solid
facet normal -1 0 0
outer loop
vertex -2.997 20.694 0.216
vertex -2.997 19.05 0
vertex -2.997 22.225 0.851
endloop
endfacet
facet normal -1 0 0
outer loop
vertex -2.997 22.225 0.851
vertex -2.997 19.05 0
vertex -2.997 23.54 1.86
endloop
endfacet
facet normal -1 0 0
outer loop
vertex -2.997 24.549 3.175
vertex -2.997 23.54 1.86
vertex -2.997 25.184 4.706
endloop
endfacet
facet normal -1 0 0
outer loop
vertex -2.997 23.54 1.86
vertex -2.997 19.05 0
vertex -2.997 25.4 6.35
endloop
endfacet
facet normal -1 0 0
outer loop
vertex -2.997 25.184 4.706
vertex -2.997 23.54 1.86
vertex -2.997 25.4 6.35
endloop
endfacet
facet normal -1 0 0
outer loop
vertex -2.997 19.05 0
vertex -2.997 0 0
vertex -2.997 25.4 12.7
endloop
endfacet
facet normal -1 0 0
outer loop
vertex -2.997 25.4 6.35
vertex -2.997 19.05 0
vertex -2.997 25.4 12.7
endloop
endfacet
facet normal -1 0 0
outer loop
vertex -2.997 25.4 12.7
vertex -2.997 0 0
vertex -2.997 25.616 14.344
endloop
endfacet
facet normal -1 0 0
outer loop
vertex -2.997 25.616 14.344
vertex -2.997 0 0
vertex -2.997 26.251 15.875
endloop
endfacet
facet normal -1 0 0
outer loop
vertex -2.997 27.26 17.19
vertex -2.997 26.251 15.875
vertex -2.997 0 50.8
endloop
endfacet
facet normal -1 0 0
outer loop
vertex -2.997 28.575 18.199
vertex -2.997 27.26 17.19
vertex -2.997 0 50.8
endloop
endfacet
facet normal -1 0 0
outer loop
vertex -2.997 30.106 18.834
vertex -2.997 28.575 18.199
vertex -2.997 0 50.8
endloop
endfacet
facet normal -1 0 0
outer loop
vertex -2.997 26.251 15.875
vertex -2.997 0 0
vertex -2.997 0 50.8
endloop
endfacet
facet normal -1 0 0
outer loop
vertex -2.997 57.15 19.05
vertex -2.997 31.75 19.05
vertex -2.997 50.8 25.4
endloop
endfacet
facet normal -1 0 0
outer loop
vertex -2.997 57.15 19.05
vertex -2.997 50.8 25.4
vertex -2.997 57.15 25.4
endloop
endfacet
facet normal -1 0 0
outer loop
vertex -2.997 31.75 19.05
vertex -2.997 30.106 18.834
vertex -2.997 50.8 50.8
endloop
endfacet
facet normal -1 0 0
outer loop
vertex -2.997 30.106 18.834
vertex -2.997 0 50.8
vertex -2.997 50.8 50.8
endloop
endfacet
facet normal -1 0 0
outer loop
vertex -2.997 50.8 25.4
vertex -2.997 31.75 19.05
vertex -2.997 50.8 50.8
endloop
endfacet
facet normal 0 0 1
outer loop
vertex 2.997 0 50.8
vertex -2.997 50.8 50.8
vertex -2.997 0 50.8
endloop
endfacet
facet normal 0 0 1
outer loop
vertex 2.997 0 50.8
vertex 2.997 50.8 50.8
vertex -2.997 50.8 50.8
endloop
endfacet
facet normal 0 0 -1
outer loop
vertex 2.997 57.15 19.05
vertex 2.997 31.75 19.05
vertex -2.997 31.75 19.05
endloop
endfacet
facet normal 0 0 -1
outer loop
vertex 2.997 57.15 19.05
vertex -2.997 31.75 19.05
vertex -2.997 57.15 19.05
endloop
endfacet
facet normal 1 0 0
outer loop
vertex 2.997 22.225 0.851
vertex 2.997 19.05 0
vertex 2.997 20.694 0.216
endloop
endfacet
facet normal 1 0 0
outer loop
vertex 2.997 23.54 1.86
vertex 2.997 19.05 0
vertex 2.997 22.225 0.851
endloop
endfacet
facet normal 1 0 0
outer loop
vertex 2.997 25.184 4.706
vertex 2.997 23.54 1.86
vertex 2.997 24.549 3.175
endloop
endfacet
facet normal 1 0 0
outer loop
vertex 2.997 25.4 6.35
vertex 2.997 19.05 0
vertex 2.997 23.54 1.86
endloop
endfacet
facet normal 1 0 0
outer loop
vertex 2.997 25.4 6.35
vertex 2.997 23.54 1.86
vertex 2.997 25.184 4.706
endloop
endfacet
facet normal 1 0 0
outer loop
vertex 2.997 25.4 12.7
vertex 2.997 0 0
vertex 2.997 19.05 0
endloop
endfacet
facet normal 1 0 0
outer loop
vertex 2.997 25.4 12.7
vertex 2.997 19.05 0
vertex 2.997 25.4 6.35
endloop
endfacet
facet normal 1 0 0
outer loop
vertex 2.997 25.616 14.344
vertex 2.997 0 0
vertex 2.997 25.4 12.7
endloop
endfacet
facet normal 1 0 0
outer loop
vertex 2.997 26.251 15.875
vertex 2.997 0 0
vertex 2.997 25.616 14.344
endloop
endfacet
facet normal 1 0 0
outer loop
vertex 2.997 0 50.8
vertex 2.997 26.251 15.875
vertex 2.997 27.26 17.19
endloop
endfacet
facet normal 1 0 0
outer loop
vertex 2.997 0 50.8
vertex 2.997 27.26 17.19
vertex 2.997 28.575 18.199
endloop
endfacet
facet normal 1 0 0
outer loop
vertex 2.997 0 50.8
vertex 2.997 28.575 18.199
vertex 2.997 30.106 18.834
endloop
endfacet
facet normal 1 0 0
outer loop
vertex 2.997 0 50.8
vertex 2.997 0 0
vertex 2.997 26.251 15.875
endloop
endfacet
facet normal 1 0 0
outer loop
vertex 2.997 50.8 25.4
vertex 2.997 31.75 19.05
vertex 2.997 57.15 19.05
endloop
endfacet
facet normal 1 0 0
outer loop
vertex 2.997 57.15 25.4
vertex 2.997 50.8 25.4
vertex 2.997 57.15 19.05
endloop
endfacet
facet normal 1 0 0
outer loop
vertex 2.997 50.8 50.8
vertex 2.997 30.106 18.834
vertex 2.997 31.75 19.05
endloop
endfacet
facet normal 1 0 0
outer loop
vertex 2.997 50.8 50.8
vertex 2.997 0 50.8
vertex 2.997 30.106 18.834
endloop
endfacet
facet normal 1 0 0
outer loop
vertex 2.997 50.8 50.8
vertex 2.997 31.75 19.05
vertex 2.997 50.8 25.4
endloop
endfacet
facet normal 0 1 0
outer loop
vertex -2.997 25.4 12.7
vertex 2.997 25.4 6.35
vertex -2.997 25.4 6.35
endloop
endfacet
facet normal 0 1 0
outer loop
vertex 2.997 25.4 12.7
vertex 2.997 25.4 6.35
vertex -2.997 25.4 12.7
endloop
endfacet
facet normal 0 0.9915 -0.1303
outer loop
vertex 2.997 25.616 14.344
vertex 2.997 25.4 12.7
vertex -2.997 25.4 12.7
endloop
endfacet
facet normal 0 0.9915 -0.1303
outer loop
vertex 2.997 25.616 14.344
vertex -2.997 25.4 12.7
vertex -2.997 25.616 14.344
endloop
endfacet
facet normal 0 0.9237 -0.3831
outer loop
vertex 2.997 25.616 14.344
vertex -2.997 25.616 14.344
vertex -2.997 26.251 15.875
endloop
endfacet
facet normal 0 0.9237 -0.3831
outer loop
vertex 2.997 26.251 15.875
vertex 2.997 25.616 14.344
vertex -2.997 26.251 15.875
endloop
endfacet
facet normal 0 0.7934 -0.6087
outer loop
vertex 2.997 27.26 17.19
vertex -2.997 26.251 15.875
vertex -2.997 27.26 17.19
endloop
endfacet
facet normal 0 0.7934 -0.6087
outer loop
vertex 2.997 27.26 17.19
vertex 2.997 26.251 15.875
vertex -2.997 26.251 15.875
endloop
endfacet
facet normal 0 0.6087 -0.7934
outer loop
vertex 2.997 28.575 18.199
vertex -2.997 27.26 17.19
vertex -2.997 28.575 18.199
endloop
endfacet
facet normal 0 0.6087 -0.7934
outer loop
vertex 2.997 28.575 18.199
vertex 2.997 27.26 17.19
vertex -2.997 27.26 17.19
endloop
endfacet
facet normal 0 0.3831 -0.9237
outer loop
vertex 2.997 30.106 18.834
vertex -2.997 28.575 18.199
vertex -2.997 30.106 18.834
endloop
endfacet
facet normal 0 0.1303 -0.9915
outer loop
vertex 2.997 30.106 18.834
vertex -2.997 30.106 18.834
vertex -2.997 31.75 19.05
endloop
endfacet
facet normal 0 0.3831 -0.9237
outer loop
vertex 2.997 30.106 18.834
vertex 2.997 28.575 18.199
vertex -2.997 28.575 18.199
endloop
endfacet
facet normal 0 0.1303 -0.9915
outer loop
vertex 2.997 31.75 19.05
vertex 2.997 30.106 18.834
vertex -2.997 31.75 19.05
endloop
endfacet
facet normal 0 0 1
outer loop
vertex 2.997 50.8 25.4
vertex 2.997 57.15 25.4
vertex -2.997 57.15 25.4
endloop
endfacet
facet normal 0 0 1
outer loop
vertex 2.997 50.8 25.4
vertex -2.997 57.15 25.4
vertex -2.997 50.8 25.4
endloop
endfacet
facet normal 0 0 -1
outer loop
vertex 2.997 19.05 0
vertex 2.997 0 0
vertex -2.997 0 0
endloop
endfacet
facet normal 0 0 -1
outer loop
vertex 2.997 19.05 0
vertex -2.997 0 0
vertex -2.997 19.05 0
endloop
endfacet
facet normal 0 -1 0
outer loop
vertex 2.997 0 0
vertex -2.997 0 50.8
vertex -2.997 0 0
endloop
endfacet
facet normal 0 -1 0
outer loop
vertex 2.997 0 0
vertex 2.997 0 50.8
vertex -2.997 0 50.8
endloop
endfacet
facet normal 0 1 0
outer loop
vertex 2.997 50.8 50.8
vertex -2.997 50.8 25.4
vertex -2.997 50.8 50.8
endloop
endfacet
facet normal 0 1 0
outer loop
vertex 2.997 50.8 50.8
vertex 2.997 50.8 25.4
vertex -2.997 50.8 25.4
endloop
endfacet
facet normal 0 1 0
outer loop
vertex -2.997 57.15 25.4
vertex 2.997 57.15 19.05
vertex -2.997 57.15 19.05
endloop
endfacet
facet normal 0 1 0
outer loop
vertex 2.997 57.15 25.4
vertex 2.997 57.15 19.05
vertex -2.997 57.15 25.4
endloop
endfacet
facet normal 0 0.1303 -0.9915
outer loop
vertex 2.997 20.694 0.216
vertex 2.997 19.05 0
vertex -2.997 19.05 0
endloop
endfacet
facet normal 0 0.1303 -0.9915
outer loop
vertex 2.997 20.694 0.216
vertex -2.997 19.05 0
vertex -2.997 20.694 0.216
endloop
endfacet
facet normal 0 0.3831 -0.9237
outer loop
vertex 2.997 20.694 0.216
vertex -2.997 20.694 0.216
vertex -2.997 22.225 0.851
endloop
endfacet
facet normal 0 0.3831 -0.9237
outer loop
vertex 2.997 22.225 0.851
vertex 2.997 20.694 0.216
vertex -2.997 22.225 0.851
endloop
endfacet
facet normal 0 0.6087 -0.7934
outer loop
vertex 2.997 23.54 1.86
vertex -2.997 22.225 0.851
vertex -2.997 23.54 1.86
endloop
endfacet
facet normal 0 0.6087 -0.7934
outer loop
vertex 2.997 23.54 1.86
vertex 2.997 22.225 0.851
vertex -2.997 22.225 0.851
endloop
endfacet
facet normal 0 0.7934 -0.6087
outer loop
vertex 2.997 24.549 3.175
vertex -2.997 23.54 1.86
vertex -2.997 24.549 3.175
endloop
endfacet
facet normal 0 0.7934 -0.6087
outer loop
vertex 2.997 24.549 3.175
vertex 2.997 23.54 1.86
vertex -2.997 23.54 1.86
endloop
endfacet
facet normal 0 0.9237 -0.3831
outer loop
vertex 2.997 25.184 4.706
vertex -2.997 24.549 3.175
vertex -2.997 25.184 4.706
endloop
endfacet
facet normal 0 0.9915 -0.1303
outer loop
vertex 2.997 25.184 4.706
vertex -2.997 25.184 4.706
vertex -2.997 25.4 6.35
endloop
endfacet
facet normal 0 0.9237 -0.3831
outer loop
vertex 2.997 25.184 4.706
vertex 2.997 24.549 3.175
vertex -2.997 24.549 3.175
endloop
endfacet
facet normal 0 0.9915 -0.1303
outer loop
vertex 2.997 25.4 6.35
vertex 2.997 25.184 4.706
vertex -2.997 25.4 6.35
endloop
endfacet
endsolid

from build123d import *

# Parameters (mm, degrees)
F1_DEPTH = 2.9972


with BuildPart() as f1:
    # F0 (on Right) → F1 (new body, symmetric)
    with BuildSketch(Plane.YZ):
        with BuildLine():
            Line((0, 50.8), (0, 0))
            Line((0, 0), (19.05, 0))
            ThreePointArc((19.05, 0), (23.5401280605, 1.8598719395), (25.4, 6.35))
            Line((25.4, 6.35), (25.4, 12.7))
            ThreePointArc((25.4, 12.7), (27.2598719395, 17.1901280605), (31.75, 19.05))
            Line((31.75, 19.05), (57.15, 19.05))
            Line((57.15, 19.05), (57.15, 25.4))
            Line((57.15, 25.4), (50.8, 25.4))
            Line((50.8, 25.4), (50.8, 50.8))
            Line((50.8, 50.8), (0, 50.8))
        make_face()
    extrude(amount=F1_DEPTH, both=True)


solid = f1.part
